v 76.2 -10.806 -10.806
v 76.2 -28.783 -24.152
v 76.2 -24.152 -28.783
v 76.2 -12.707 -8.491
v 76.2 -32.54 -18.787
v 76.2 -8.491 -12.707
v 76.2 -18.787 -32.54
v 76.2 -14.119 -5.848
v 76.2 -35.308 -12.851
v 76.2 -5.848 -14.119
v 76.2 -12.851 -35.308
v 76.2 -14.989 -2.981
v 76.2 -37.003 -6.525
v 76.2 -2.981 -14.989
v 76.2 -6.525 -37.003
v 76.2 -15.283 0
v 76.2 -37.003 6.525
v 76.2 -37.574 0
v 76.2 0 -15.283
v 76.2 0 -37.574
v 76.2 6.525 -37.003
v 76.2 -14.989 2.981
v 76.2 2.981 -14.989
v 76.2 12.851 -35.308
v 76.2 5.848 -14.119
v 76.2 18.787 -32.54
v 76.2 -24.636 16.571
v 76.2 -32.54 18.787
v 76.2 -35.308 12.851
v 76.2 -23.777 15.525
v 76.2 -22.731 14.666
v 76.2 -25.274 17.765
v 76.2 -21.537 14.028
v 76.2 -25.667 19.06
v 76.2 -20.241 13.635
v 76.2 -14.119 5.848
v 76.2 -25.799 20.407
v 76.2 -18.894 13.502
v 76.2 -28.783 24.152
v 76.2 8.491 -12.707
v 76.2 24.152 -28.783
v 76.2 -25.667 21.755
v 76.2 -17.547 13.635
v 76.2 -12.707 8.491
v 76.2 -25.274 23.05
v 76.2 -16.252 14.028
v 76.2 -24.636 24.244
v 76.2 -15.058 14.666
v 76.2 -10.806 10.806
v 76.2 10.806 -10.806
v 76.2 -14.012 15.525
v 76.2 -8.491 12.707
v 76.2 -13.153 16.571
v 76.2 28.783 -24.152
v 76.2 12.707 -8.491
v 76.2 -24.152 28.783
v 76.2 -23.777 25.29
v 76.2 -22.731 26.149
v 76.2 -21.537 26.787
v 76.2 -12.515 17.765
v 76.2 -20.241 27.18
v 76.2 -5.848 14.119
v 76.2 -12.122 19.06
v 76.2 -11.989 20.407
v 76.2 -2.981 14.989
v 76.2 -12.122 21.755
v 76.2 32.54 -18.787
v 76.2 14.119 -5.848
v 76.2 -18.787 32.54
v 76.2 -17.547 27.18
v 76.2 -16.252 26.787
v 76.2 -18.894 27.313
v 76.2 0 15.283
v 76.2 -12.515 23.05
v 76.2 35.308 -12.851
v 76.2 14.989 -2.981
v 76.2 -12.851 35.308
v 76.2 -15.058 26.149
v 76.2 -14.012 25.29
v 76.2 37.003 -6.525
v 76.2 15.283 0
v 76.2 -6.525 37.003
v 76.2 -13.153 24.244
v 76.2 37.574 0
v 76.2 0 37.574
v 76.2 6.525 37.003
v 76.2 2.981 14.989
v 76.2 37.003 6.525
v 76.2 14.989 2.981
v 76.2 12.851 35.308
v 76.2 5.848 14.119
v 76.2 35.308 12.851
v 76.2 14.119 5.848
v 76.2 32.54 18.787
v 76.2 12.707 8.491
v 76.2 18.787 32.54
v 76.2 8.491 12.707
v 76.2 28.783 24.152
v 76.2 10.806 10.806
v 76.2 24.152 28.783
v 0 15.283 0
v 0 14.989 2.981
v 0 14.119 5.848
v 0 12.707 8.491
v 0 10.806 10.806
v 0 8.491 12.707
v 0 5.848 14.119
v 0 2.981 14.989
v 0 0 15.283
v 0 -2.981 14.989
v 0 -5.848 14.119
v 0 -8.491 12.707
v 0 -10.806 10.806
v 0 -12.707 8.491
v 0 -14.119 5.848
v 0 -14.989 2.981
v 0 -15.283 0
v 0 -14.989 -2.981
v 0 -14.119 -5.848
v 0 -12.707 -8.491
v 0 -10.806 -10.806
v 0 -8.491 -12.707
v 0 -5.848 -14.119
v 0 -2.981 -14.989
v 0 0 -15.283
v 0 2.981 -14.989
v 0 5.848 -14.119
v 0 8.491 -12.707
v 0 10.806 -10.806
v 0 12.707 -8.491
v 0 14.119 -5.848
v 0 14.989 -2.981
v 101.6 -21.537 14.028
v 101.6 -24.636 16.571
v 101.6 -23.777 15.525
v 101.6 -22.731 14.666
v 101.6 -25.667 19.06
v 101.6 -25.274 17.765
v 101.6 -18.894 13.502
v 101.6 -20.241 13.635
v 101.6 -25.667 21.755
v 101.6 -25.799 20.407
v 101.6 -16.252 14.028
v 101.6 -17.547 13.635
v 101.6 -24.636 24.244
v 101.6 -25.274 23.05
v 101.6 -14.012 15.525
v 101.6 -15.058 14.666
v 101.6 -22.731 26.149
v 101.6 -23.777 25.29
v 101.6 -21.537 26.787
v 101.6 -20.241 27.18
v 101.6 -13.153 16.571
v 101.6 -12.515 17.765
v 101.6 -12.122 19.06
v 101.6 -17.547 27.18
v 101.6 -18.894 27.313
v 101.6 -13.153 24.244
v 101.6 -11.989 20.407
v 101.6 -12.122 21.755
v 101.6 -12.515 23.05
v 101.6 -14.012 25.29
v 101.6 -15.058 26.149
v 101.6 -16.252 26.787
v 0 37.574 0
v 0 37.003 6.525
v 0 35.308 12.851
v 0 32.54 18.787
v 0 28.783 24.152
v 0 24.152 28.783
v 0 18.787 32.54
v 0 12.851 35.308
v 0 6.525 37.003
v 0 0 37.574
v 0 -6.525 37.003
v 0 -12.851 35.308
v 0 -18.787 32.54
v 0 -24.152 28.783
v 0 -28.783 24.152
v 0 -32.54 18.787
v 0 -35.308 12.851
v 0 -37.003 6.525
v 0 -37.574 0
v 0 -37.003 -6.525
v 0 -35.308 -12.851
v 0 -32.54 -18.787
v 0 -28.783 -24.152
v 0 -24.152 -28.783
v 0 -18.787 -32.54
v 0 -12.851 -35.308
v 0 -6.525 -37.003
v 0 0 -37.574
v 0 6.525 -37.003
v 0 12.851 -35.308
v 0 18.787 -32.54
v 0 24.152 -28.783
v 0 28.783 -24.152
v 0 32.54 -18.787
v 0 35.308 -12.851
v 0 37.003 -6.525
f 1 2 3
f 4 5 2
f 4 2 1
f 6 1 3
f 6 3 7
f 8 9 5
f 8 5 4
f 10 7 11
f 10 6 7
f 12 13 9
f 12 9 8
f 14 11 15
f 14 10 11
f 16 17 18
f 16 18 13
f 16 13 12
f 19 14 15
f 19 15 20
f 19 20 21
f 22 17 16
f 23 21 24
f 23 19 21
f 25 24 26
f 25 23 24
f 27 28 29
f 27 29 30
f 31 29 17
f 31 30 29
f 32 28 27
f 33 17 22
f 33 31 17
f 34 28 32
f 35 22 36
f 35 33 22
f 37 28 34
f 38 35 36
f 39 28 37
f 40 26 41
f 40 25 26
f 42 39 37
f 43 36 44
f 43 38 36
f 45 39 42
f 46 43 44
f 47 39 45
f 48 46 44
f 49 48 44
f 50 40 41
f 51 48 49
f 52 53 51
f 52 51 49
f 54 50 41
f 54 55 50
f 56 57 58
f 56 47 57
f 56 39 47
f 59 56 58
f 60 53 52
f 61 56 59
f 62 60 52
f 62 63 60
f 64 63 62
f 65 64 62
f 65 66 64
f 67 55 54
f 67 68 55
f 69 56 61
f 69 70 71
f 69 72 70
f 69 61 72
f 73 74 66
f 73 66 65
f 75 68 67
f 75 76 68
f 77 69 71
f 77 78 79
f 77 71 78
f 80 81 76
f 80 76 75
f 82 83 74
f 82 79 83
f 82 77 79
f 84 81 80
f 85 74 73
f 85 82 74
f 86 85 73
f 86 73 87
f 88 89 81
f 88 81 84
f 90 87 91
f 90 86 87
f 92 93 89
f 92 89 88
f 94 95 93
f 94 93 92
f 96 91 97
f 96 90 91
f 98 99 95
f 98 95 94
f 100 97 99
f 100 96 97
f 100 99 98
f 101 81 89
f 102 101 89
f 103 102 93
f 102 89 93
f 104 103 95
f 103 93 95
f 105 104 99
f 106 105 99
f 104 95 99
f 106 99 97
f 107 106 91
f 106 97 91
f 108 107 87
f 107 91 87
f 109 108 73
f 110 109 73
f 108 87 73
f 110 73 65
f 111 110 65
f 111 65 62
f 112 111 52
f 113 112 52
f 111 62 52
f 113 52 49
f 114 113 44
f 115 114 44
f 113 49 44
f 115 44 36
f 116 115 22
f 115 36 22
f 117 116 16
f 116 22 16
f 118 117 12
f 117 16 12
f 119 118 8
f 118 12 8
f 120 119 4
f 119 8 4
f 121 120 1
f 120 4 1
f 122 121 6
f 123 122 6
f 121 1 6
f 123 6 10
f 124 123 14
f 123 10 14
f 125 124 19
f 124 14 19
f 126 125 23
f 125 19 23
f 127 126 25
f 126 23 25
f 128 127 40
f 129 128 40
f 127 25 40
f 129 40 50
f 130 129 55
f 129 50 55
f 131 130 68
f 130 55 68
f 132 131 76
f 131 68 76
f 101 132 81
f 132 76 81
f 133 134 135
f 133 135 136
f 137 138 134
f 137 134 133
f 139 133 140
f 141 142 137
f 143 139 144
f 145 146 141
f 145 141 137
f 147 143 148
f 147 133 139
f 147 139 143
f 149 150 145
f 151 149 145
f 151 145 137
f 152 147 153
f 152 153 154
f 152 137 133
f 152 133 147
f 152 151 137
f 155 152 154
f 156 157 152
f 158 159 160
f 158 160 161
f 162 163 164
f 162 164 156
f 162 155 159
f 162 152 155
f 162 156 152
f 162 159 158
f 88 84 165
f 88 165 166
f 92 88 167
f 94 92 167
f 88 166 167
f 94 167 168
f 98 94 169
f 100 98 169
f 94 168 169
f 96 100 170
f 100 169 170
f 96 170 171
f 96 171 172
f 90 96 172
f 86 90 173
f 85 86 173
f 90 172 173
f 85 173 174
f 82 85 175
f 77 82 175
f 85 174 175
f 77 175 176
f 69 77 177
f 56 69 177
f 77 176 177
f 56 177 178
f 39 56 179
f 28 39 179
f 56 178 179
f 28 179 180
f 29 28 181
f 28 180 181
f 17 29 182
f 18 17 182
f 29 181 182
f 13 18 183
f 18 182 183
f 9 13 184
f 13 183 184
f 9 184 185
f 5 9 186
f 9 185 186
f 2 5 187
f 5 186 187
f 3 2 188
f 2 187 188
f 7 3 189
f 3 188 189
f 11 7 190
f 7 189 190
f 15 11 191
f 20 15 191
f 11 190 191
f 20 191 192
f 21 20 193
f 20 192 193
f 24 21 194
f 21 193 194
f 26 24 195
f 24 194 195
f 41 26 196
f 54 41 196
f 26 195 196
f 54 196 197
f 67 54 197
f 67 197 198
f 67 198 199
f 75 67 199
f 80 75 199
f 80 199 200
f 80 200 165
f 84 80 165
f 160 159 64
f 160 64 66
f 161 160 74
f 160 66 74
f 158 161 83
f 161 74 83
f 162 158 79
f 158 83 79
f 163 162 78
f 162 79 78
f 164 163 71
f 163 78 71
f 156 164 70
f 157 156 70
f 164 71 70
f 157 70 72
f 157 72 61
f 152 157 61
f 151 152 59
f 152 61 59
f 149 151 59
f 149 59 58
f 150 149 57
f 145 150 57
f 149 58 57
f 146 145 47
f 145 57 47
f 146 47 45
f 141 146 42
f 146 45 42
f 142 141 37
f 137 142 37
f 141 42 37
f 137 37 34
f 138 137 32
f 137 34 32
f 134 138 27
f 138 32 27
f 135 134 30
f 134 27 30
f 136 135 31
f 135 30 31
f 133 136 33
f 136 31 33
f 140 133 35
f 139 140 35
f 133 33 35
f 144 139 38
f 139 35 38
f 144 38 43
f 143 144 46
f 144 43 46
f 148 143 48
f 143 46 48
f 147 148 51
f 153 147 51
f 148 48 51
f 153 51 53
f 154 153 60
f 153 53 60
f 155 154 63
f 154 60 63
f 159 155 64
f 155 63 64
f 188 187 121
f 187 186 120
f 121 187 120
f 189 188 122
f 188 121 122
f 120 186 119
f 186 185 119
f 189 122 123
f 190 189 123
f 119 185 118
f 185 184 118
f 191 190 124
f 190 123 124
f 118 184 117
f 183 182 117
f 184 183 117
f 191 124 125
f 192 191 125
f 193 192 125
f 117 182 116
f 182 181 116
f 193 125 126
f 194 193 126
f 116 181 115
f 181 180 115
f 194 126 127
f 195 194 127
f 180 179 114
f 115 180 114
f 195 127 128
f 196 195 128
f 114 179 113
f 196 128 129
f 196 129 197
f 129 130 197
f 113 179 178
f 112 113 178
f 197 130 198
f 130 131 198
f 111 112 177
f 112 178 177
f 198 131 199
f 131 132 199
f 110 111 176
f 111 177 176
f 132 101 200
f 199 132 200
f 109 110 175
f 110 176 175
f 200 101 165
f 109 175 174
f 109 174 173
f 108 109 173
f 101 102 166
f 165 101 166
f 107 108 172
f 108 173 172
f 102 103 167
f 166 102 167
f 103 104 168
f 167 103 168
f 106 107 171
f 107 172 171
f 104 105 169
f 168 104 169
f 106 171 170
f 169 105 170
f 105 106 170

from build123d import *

# Parameters (mm, degrees)
F0_R     = 37.573612
F1_DEPTH = 76.2
F2_R     = 15.282658
F3_DEPTH = 76.2
F4_R     = 6.905206
F5_DEPTH = 25.4


with BuildPart() as f1:
    # F0 (on Right) → F1 (new body)
    with BuildSketch(Plane.YZ):
        Circle(F0_R)
    extrude(amount=F1_DEPTH)

    # F2 (on face) → F3 (cut)
    with BuildSketch(Plane.YZ.offset(76.2)):
        Circle(F2_R)
    extrude(amount=-F3_DEPTH, mode=Mode.SUBTRACT)

    # F4 (on face) → F5 (join)
    with BuildSketch(Plane.YZ.offset(76.2)):
        with Locations((-18.894237, 20.407373)):
            Circle(F4_R)
    extrude(amount=F5_DEPTH)


solid = f1.part
